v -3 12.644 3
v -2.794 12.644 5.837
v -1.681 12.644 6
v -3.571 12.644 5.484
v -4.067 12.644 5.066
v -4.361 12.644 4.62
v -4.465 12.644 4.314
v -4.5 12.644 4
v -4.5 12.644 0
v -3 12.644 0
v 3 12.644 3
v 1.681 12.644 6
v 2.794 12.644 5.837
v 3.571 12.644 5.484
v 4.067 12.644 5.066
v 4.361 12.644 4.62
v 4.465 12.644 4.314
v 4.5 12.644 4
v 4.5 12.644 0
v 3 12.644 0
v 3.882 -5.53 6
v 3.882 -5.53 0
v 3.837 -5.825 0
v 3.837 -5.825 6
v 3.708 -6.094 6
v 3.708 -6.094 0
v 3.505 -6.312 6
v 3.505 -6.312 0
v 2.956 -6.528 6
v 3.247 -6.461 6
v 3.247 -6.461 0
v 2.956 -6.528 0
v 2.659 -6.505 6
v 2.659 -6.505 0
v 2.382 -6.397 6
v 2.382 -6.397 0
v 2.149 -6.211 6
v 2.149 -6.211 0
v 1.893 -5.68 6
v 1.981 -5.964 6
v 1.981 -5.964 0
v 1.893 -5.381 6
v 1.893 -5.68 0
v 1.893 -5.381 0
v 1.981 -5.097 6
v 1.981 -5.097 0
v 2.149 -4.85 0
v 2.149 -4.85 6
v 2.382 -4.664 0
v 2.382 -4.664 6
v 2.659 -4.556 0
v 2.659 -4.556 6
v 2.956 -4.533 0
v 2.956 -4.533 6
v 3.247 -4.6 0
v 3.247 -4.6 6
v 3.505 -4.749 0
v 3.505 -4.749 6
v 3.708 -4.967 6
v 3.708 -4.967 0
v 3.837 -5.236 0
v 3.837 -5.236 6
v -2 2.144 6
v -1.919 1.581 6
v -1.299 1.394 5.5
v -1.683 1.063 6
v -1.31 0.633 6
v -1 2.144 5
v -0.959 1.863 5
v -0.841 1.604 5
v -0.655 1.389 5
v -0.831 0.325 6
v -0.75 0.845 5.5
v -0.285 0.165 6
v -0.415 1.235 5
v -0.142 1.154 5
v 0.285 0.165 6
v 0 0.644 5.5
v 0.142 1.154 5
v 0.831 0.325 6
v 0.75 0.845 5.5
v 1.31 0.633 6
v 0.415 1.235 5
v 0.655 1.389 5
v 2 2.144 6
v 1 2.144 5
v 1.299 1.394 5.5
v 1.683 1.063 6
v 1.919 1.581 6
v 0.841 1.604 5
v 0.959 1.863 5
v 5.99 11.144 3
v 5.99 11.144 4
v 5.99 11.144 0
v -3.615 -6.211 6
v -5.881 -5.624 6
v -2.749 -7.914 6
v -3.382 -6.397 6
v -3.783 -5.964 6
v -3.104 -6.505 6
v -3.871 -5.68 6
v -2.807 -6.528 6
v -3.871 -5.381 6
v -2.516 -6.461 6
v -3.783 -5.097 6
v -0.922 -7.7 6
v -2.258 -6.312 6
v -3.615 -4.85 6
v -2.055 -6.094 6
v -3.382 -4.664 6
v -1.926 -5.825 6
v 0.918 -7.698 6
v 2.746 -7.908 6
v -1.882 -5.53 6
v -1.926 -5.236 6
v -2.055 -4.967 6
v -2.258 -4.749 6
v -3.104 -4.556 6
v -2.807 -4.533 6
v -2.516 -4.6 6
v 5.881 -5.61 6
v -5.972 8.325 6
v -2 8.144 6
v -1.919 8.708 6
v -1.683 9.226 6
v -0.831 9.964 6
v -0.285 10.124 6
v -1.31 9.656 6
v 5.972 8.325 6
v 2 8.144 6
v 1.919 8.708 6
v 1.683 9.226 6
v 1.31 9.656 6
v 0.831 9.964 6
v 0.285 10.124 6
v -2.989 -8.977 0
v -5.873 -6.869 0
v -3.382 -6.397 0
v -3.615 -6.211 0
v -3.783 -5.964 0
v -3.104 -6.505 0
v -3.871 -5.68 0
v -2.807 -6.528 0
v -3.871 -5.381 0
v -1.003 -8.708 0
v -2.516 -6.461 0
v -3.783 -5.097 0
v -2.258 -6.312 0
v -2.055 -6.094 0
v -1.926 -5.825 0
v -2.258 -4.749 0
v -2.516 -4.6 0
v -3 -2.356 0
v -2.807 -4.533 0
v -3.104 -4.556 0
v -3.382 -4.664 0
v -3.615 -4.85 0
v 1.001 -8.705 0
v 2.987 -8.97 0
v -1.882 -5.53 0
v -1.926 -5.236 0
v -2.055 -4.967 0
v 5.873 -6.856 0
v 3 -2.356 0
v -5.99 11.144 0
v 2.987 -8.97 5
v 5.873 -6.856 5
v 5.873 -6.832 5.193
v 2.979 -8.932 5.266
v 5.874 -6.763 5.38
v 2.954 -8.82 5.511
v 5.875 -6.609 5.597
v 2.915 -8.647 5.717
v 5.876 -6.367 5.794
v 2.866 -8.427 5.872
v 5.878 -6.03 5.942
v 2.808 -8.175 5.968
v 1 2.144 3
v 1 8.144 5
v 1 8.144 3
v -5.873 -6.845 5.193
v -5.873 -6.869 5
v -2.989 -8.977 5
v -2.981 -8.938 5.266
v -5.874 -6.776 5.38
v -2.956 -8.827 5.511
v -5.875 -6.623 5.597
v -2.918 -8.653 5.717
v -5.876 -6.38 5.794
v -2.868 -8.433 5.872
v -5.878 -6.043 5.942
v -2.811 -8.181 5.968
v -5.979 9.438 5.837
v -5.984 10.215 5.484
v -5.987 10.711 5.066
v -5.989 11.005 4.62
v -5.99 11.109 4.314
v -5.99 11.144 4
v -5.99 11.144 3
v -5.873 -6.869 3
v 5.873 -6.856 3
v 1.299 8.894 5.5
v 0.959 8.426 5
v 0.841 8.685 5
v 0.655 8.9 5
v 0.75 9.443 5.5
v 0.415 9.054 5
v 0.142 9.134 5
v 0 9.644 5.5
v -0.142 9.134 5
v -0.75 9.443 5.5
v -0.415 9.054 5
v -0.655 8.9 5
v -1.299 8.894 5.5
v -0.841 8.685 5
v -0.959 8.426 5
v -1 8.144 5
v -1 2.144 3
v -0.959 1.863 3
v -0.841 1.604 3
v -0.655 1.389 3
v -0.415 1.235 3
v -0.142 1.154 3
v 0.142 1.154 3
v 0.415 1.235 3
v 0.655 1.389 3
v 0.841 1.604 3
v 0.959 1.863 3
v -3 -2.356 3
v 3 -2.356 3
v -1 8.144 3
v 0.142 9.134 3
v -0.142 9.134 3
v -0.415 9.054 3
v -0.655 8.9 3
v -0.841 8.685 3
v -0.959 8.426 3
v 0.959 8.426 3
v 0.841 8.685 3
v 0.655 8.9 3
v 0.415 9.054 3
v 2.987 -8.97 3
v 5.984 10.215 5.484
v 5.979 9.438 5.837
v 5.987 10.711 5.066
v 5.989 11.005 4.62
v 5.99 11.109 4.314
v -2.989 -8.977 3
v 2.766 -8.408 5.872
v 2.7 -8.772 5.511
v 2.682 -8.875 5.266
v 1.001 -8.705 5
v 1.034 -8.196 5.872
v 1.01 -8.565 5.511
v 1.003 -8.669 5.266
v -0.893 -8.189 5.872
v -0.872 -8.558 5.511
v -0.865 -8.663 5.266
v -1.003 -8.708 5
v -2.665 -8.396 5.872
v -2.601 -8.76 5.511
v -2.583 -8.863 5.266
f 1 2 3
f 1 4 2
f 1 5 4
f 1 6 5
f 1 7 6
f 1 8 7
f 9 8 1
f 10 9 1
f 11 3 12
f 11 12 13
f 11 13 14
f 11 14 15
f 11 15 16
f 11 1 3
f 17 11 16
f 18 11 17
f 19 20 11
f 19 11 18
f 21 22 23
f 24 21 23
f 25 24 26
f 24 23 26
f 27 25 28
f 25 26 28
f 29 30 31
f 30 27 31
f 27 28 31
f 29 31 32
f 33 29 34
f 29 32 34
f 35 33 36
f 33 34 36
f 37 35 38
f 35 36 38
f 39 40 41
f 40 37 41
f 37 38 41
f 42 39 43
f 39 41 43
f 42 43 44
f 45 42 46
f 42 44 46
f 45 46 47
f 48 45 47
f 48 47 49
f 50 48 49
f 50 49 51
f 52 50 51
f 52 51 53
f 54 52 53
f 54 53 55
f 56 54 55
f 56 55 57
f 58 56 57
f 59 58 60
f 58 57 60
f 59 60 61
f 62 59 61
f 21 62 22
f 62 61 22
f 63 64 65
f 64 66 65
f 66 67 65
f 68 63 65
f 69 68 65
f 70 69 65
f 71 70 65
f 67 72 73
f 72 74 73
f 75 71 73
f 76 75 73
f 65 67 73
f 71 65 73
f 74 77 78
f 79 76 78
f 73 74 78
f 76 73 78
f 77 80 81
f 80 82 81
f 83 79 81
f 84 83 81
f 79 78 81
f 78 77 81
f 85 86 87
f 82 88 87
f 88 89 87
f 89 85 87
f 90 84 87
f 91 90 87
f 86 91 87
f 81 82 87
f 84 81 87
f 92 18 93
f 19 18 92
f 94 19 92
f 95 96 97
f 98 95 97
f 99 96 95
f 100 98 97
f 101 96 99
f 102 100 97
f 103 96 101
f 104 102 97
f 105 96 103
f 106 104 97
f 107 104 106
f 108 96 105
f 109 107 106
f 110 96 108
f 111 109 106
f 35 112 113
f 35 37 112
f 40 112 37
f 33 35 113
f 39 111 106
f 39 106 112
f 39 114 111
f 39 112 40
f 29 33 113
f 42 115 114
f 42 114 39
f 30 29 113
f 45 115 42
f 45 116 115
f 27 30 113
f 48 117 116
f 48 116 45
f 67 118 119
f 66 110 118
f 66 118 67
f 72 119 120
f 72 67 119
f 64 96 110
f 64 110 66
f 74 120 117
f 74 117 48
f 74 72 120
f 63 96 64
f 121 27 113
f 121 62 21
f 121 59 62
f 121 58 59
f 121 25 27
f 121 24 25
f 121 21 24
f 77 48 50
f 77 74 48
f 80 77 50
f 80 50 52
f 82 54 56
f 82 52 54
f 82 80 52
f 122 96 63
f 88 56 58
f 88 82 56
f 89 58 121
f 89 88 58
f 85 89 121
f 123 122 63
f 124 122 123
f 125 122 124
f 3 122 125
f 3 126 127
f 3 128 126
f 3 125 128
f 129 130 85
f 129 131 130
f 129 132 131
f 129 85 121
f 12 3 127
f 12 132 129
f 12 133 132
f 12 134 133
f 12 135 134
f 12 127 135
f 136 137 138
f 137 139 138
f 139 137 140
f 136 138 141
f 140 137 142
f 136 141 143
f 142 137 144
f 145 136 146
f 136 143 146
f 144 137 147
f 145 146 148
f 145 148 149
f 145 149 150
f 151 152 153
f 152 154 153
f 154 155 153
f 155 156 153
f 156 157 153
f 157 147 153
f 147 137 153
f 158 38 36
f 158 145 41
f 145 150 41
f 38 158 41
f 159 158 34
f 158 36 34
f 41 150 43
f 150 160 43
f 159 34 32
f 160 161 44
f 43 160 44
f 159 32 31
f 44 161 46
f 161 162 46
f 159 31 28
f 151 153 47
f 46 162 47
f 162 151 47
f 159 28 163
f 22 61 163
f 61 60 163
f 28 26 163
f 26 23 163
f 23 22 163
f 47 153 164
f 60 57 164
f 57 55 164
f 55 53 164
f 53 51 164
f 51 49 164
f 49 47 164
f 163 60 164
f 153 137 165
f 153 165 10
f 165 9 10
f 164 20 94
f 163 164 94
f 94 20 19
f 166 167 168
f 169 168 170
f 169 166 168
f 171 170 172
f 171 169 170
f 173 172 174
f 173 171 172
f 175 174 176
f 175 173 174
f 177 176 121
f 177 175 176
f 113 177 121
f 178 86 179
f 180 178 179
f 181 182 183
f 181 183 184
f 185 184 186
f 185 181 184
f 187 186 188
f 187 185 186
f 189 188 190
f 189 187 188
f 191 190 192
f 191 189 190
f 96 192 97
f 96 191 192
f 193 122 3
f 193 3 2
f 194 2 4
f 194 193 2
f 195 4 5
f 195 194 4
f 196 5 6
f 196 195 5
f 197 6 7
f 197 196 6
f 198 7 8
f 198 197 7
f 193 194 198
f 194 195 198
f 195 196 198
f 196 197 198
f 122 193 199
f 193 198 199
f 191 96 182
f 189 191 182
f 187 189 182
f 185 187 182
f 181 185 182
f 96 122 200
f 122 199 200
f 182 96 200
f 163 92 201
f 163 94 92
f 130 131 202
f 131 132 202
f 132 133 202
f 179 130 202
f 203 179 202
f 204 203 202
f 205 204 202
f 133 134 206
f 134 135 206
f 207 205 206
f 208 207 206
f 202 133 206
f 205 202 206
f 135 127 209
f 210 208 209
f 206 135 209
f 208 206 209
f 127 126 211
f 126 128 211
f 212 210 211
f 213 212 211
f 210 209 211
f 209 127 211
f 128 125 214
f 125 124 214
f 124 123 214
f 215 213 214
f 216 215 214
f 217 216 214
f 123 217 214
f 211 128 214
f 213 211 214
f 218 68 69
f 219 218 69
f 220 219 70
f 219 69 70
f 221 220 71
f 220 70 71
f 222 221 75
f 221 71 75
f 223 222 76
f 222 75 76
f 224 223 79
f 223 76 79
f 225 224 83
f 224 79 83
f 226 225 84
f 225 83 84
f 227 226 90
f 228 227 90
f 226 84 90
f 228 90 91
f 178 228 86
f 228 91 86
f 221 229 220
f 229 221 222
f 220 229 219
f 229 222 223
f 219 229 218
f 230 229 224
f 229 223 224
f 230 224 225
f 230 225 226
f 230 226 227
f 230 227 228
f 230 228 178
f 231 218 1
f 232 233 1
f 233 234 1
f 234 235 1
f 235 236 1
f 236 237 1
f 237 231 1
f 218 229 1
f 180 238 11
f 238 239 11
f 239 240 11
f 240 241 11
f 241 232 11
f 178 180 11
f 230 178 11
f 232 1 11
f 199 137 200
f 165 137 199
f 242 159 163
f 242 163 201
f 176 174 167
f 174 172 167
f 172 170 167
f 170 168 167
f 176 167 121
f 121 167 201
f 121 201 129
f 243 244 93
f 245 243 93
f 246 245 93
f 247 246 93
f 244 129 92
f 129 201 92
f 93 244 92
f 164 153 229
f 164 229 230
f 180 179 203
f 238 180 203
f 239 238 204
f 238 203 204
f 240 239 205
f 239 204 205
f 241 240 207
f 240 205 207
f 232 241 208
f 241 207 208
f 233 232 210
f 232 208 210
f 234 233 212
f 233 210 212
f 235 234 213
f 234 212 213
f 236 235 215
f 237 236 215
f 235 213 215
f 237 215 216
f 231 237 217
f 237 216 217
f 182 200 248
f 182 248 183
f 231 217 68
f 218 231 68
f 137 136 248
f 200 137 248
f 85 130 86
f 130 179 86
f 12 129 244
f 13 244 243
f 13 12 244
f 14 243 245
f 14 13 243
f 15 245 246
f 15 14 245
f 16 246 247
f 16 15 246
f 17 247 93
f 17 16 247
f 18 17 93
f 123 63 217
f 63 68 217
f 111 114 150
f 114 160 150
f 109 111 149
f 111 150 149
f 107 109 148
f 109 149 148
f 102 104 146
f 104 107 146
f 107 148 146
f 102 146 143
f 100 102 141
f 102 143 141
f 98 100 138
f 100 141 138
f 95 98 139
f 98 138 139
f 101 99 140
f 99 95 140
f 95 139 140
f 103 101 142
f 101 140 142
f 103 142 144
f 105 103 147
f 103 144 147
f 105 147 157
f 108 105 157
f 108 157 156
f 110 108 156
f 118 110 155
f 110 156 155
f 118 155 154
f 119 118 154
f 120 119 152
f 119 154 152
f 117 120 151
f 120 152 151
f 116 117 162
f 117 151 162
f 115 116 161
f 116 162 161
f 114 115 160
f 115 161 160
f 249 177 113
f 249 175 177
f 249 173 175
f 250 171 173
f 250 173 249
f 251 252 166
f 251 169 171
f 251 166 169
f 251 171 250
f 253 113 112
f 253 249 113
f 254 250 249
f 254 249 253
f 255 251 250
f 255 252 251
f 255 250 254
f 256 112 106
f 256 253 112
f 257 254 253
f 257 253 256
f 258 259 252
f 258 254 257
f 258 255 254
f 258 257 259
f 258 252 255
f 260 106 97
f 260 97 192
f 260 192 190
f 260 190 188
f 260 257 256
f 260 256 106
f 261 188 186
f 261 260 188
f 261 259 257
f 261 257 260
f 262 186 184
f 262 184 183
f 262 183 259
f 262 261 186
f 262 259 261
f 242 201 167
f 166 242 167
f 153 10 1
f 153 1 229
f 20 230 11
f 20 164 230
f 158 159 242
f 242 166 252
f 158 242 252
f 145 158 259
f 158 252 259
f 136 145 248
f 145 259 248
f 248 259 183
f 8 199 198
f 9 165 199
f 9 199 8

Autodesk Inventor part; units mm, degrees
ref_plane "YZ Plane" through (0, 0, 0) normal (1, 0, 0) x (0, 1, 0)
ref_plane "XZ Plane" through (0, 0, 0) normal (0, 1, 0) x (-1, 0, 0)
ref_plane "XY Plane" through (0, 0, 0) normal (0, 0, 1) x (1, 0, 0)
sketch "Sketch1" plane through (0, 0, 0) normal (0, 0, 1) x (1, 0, 0)
  circle A0 centre (2.8817, -5.5305) radius 1 projected
  circle A1 centre (-2.8817, -5.5305) radius 1 projected
  line L0 (4.5, 12.6443) -> (5.9902, 11.1443) projected
  line L1 (3, 12.6443) -> (4.5, 12.6443) projected
  line L2 (3, -2.3557) -> (3, 12.6443) projected
  line L3 (-3, -2.3557) -> (3, -2.3557) projected
  line L4 (-3, 12.6443) -> (-3, -2.3557) projected
  line L5 (-4.5, 12.6443) -> (-3, 12.6443) projected
  line L6 (-5.9902, 11.1443) -> (-4.5, 12.6443) projected
  line L7 (-5.8406, -11.8556) -> (-5.9902, 11.1443) projected
  line L8 (-3.8536, -9.8557) -> (-5.8406, -11.8556) projected
  line L9 (-3.8536, -9.8557) -> (3.8536, -9.8557) projected
  line L10 (5.8406, -11.8556) -> (3.8536, -9.8557) projected
  line L11 (5.9902, 11.1443) -> (5.8406, -11.8556) projected
  line L12 (3.8536, -9.8557) -> (5.8536, -9.8557)
  line L13 (-3.8536, -9.8557) -> (-5.8535, -9.8687)
  point P0 (0, 0)
extrude "Extrusion1" add sketch "Sketch1" along normal blind 3 contours L0 L11 L12 L9 L13 L7 L6 L5 L4 L3 L2 L1
sketch "Sketch2" plane through (0, 0, 3) normal (0, 0, 1) x (1, 0, 0)
  line L0 (-3, -2.3557) -> (-3, 12.6443) projected
  line L1 (-3, 12.6443) -> (-4.5, 12.6443) projected
  line L2 (-4.5, 12.6443) -> (-5.9902, 11.1443) projected
  line L3 (-5.9902, 11.1443) -> (-5.8535, -9.8687) projected
  line L4 (-5.8535, -9.8687) -> (-3.8536, -9.8557) projected
  line L5 (-3.8536, -9.8557) -> (5.8536, -9.8557) projected
  line L6 (5.8536, -9.8557) -> (5.9902, 11.1443) projected
  line L7 (5.9902, 11.1443) -> (4.5, 12.6443) projected
  line L8 (4.5, 12.6443) -> (3, 12.6443) projected
  line L9 (3, 12.6443) -> (3, -2.3557) projected
  line L10 (3, -2.3557) -> (-3, -2.3557) projected
  circle A0 centre (-2.8817, -5.5305) radius 1 projected
  circle A1 centre (2.8817, -5.5305) radius 1 projected
  line L11 (3, 12.6443) -> (3, -2.3557) projected
  line L12 (-3, 12.6443) -> (3, 12.6443)
  point P0 (0, 0)
extrude "Extrusion2" add sketch "Sketch2" along normal blind 3
sketch "Sketch3" plane through (0, 0, 6) normal (0, 0, 1) x (1, 0, 0)
  line L0 (-5.8535, -9.8687) -> (-3.8536, -9.8557) projected
  line L1 (-3.8536, -9.8557) -> (5.8536, -9.8557) projected
  line L2 (5.8536, -9.8557) -> (5.9902, 11.1443) projected
  line L3 (5.9902, 11.1443) -> (4.5, 12.6443) projected
  line L4 (4.5, 12.6443) -> (-4.5, 12.6443) projected
  line L5 (-4.5, 12.6443) -> (-5.9902, 11.1443) projected
  line L6 (-5.9902, 11.1443) -> (-5.8535, -9.8687) projected
  circle A0 centre (2.8817, -5.5305) radius 1 projected
  circle A1 centre (-2.8817, -5.5305) radius 1 projected
  line L7 (-5.8535, -9.8687) -> (-3.8536, -9.8557) projected
  arc A2 (5.8536, -9.8557) -> (-5.8535, -9.8687) centre (0.0154, -23.6729) ccw
  point P0 (0, 0)
  dimension "d4" = 15
extrude "Extrusion3" cut sketch "Sketch3" against normal blind 8 contours A2 L1 L0
chamfer "Chamfer1" distance 3 angle 45 2 edges at (5.8536, -9.8557, 3) (-5.8535, -9.8687, 3)
fillet "Fillet1" radius 2 2 edges at (5.2451, 11.8943, 6) (-5.2451, 11.8943, 6)
fillet "Fillet2" radius 1 3 edges at (-4.4311, -7.9228, 6) (-0.0013, -8.6729, 6) (4.4302, -7.913, 6)
sketch "Sketch4" plane through (0, 0, 6) normal (0, 0, 1) x (1, 0, 0)
  line L0 (-1, 8.1443) -> (-1, 2.1443) projected
  arc A0 (-1, 2.1443) -> (1, 2.1443) centre (0, 2.1443) ccw projected
  line L1 (1, 2.1443) -> (1, 8.1443) projected
  arc A1 (1, 8.1443) -> (-1, 8.1443) centre (0, 8.1443) ccw projected
  line L2 (5.9719, 8.3251) -> (1.6807, 12.6443) projected
  line L3 (5.9719, 8.3251) -> (5.8537, -9.8477) projected
  line L4 (3.4979, -11.4182) -> (5.8537, -9.8477) projected
  spline S0 degree 3 poles (3.7471, -14.0453) (3.5143, -13.7817) (3.313, -13.4738) (3.0785, -12.9028) (3.0205, -12.6553) (3.011, -12.2509) (3.0346, -12.0815) (3.1344, -11.8203) (3.188, -11.725) (3.325, -11.5531) (3.4063, -11.4793) (3.4979, -11.4182) knots 0 0 0 0 0.105501 0.105501 0.185956 0.185956 0.244407 0.244407 0.282215 0.282215 0.320119 0.320119 0.320119 0.320119 projected
  arc A2 (-3.7471, -14.0453) -> (3.7471, -14.0453) centre (0, -17.3557) ccw projected
  spline S1 degree 3 poles (-3.4979, -11.4182) (-3.3811, -11.4961) (-3.2816, -11.5944) (-3.1273, -11.8263) (-3.0754, -11.9539) (-3.0096, -12.2519) (-3.0068, -12.4209) (-3.0565, -12.825) (-3.1338, -13.0604) (-3.3668, -13.5541) (-3.5446, -13.816) (-3.7471, -14.0453) knots 0 0 0 0 0.042129 0.042129 0.083567 0.083567 0.133564 0.133564 0.205298 0.205298 0.296261 0.296261 0.296261 0.296261 projected
  line L5 (-5.8537, -9.8477) -> (-3.4979, -11.4182) projected
  line L6 (-5.8537, -9.8477) -> (-5.9719, 8.3251) projected
  line L7 (-1.6807, 12.6443) -> (-5.9719, 8.3251) projected
  line L8 (-1.6807, 12.6443) -> (1.6807, 12.6443) projected
  circle A3 centre (0, -17.3557) radius 1.5 projected
  circle A4 centre (-2.8817, -5.5305) radius 1 projected
  circle A5 centre (2.8817, -5.5305) radius 1 projected
  point P0 (0, 0)
extrude "Extrusion4" cut sketch "Sketch4" against normal blind 8 contours A1 L1 A0 L0
chamfer "Chamfer2" distance 1 angle 45 4 edges at (-1, 5.1443, 6) (0, 9.1443, 6) (1, 5.1443, 6) (0, 1.1443, 6)
properties part number "arm_linkage_3"
